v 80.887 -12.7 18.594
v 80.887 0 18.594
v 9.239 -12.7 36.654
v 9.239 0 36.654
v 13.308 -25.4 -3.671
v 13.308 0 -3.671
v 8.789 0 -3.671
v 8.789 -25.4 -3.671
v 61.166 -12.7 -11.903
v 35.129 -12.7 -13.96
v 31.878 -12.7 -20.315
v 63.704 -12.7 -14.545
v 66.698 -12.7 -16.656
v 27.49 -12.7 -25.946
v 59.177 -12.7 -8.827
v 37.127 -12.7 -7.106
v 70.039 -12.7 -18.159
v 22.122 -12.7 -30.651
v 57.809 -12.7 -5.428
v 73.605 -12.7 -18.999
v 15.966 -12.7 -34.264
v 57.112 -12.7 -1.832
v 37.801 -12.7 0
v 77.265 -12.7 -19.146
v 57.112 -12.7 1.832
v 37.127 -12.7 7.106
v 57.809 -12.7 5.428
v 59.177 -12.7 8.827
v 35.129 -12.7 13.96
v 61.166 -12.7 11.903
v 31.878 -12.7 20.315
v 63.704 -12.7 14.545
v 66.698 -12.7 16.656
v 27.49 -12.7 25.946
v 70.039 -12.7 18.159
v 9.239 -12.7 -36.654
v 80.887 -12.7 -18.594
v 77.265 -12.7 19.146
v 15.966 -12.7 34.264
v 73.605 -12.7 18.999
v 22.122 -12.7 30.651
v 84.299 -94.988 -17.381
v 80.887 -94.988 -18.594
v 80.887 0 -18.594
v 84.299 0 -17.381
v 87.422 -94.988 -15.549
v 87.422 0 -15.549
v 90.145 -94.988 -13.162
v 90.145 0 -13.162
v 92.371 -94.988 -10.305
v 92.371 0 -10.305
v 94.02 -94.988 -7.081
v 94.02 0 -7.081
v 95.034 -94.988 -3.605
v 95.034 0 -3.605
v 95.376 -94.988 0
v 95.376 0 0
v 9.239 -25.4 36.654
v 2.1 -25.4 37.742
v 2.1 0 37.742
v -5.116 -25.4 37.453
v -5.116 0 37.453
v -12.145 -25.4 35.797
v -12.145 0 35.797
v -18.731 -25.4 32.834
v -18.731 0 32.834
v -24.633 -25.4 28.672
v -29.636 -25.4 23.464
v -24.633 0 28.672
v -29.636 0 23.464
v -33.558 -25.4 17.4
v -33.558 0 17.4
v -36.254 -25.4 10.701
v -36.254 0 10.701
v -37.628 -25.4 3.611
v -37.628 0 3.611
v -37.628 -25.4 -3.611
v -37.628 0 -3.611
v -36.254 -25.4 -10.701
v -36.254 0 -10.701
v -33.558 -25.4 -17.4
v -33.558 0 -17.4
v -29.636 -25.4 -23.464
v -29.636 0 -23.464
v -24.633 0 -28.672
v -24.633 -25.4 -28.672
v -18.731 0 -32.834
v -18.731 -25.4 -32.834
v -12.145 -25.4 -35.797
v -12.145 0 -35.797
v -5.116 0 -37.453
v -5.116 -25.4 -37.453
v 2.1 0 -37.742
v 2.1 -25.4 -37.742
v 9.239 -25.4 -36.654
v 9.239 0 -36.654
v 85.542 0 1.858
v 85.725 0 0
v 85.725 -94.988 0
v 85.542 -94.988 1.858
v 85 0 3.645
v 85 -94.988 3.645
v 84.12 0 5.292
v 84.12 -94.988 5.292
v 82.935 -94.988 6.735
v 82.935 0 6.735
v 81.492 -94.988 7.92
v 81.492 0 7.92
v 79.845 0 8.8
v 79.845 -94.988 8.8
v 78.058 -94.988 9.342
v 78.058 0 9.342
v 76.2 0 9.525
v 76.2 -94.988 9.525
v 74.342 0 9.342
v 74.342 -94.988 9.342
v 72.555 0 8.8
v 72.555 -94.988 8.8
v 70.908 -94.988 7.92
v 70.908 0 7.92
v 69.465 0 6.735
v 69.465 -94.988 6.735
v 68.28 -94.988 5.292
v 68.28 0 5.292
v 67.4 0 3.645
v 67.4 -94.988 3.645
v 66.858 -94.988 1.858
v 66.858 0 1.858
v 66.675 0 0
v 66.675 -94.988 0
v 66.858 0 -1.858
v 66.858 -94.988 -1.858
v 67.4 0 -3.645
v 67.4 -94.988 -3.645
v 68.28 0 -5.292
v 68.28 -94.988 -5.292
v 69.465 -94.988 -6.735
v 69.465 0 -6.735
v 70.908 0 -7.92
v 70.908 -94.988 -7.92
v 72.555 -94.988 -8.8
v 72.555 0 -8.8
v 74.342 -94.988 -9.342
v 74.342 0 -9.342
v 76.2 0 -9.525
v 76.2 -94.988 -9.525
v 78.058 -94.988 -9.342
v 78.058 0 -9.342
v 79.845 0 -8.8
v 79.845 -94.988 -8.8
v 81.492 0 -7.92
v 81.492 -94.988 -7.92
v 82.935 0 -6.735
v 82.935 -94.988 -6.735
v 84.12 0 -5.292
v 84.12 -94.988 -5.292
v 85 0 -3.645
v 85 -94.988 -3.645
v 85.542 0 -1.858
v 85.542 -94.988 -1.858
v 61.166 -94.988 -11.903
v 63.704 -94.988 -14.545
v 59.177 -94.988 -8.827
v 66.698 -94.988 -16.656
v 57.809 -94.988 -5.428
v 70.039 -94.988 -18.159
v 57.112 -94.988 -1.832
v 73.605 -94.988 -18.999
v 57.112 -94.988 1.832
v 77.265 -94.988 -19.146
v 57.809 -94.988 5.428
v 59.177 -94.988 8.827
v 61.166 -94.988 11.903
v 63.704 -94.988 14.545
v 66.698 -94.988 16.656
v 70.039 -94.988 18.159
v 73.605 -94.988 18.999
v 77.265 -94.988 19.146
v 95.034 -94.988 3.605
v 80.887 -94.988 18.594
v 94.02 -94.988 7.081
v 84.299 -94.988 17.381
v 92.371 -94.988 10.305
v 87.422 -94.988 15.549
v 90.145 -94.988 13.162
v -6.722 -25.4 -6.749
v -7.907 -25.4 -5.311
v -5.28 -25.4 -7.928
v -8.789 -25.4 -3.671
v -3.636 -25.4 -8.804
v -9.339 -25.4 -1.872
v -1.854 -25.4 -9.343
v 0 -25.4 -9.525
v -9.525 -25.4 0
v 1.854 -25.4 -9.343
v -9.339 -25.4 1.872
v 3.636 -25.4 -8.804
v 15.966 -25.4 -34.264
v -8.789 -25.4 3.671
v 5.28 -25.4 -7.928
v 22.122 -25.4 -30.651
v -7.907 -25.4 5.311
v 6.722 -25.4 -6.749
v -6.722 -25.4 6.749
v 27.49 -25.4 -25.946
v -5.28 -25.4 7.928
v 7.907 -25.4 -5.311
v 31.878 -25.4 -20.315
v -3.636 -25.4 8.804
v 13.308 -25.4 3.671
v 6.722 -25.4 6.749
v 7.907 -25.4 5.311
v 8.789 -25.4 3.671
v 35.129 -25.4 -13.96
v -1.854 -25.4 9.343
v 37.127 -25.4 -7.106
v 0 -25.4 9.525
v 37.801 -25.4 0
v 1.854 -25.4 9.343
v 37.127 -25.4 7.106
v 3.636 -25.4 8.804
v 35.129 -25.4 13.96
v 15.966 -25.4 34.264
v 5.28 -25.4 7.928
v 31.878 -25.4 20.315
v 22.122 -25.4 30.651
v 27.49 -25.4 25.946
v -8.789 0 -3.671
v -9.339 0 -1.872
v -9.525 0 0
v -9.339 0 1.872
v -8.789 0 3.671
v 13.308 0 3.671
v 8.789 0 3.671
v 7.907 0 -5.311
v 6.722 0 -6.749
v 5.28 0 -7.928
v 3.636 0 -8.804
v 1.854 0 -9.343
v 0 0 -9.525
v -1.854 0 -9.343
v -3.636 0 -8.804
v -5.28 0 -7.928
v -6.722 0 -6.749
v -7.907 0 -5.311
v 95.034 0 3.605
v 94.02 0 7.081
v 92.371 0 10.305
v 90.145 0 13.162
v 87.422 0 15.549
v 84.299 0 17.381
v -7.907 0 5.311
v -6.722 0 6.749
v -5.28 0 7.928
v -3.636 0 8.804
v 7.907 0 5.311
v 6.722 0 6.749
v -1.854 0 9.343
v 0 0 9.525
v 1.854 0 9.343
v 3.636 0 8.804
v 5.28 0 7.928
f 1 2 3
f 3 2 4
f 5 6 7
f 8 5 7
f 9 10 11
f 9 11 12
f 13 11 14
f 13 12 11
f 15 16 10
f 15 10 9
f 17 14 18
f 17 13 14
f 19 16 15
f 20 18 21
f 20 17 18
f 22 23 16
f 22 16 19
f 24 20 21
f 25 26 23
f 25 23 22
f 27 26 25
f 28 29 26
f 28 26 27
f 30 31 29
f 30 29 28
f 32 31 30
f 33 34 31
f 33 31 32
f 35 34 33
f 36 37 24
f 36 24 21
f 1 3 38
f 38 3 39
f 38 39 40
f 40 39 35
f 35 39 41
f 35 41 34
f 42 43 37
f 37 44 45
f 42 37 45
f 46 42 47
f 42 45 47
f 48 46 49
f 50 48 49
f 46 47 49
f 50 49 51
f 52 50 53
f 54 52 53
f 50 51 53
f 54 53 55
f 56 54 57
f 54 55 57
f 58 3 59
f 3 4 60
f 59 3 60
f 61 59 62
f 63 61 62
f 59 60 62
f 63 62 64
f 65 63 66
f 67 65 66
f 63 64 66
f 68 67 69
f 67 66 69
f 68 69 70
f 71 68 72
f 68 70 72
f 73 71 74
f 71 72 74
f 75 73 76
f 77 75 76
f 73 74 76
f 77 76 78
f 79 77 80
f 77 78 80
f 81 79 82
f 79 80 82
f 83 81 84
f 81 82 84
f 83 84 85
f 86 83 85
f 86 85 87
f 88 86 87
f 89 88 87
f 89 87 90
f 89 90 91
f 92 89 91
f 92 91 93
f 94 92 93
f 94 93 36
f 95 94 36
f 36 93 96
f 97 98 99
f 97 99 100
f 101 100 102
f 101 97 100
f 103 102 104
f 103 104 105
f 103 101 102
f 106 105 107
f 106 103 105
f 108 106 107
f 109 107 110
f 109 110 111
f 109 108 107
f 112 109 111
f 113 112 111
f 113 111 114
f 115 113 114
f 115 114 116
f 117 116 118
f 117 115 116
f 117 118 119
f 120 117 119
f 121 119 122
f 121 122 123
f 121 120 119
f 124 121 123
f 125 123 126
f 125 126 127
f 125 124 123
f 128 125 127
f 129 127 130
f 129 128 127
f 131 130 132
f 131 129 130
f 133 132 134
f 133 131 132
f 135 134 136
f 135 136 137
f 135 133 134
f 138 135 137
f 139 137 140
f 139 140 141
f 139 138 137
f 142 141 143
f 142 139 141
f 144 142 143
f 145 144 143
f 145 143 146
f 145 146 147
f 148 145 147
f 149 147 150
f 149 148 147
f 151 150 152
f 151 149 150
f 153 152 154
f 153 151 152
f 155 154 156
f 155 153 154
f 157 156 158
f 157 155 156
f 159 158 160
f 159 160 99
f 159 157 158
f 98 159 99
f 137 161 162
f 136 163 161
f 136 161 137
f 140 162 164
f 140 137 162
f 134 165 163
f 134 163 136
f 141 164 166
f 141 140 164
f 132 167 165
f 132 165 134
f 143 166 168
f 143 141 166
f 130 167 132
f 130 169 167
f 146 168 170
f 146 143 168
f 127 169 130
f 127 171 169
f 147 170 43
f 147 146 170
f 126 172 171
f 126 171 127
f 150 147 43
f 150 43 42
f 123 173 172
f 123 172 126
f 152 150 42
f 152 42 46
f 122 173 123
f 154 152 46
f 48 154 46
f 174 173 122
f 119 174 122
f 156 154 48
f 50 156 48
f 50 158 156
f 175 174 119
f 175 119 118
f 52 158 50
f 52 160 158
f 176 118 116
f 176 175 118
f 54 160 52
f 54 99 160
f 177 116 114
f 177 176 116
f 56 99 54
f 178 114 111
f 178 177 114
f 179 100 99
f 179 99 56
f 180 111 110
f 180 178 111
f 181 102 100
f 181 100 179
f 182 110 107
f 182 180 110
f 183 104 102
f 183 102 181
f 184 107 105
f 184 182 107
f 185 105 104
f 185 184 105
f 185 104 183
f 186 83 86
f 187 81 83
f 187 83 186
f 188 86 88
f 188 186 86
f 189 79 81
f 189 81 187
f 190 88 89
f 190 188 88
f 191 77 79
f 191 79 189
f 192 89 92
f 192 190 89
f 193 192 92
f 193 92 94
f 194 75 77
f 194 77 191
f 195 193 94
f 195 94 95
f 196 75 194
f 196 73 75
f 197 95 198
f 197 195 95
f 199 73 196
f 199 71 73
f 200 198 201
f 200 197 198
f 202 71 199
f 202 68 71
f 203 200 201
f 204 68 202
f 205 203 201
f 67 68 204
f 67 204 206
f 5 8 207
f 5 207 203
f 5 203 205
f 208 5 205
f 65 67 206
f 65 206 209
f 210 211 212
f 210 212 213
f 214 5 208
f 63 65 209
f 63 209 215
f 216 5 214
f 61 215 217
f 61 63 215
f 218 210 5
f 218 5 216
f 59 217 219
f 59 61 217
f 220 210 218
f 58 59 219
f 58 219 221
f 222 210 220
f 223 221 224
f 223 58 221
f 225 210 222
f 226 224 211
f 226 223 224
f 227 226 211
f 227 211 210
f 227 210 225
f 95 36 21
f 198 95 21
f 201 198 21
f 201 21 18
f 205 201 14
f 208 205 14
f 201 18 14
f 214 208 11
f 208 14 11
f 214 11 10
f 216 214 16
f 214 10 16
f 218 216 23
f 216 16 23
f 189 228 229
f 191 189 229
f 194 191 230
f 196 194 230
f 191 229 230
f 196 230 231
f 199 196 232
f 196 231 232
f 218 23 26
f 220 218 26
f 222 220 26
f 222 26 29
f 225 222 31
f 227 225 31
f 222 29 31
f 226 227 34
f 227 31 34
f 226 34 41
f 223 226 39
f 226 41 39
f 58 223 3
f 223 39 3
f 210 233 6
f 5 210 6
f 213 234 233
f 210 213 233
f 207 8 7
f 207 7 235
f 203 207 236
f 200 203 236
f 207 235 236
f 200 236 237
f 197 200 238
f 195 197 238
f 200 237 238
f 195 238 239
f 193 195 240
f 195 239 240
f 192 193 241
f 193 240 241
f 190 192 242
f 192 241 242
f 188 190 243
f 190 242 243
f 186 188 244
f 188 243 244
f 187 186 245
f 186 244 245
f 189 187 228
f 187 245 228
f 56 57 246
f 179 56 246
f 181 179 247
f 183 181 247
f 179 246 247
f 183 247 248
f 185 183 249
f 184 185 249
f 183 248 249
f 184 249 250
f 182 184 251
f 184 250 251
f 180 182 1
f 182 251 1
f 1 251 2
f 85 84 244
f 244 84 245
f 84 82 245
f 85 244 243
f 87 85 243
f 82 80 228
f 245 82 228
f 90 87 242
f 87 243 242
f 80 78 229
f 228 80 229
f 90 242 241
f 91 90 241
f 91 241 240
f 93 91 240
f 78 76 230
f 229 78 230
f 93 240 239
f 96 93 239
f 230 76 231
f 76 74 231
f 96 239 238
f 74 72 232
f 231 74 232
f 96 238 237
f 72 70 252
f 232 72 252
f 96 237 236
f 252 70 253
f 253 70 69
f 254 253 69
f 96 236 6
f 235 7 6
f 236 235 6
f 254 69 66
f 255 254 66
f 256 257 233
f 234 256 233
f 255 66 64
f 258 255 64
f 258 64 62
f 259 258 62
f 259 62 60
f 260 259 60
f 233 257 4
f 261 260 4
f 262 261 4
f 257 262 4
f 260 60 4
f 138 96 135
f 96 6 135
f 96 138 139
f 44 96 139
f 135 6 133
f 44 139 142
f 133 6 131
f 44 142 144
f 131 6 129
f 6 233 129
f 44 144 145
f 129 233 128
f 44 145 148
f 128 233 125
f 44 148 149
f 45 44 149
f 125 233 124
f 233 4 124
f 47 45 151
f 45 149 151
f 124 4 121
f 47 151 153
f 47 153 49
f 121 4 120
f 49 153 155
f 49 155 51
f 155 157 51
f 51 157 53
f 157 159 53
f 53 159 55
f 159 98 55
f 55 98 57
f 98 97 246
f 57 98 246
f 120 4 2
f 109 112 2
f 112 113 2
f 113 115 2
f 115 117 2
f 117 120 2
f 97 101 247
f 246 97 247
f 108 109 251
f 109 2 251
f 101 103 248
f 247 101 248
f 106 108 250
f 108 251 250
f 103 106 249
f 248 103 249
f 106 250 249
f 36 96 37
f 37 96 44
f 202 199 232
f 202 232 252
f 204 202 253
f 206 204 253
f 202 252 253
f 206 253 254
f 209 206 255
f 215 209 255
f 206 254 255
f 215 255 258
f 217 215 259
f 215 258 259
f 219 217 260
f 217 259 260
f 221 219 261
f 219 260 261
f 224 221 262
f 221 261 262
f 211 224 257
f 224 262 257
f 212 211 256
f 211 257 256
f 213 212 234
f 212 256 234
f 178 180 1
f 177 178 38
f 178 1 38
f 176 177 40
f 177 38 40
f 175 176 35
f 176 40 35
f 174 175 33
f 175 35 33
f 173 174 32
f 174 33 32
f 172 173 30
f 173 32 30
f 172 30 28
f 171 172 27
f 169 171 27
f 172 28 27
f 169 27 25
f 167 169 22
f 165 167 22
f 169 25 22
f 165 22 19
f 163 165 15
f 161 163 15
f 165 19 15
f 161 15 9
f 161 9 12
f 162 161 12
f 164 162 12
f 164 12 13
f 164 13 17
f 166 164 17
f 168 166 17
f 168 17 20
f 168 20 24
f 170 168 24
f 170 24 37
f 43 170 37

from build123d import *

# Parameters (mm, degrees)
F1_DEPTH = 25.4
F2_DEPTH = 12.7
F0_R     = 9.525
F3_DEPTH = 94.98793


with BuildPart() as f1:
    # F0 (on Front) → F1 (new body)
    with BuildSketch(Plane.XZ):
        with BuildLine():
            ThreePointArc((9.239379, -36.65417), (29.817356, -23.234017), (37.800718, 0))
            ThreePointArc((37.800718, 0), (29.817356, 23.234017), (9.239379, 36.65417))
            ThreePointArc((9.239379, 36.65417), (-37.800718, 0), (9.239379, -36.65417))
        make_face()
        with BuildLine():
            ThreePointArc((-8.789045, 3.671282), (0, 9.525), (8.789045, 3.671282))
            Line((8.789045, 3.671282), (13.308408, 3.671282))
            Line((13.308408, 3.671282), (13.308408, -3.671282))
            Line((13.308408, -3.671282), (8.789045, -3.671282))
            ThreePointArc((8.789045, -3.671282), (0, -9.525), (-8.789045, -3.671282))
            Line((-8.789045, -3.671282), (-13.308408, -3.671282))
            Line((-13.308408, -3.671282), (-13.308408, 3.671282))
            Line((-13.308408, 3.671282), (-8.789045, 3.671282))
        make_face(mode=Mode.SUBTRACT)
        with BuildLine():
            ThreePointArc((-8.789045, -3.671282), (-9.525, 0), (-8.789045, 3.671282))
            Line((-8.789045, 3.671282), (-13.308408, 3.671282))
            Line((-13.308408, 3.671282), (-13.308408, -3.671282))
            Line((-13.308408, -3.671282), (-8.789045, -3.671282))
        make_face()
    extrude(amount=F1_DEPTH)

    # F0 (on Front) → F2 (join)
    with BuildSketch(Plane.XZ):
        with BuildLine():
            ThreePointArc((9.239379, 36.65417), (29.817356, 23.234017), (37.800718, 0))
            ThreePointArc((37.800718, 0), (29.817356, -23.234017), (9.239379, -36.65417))
            Line((9.239379, -36.65417), (80.886979, -18.594032))
            ThreePointArc((80.886979, -18.594032), (57.024344, 0), (80.886979, 18.594032))
            Line((80.886979, 18.594032), (9.239379, 36.65417))
        make_face()
    extrude(amount=F2_DEPTH)

    # F0 (on Front) → F3 (join)
    with BuildSketch(Plane.XZ):
        with BuildLine():
            ThreePointArc((95.375656, 0), (91.325834, 11.786219), (80.886979, 18.594032))
            ThreePointArc((80.886979, 18.594032), (57.024344, 0), (80.886979, -18.594032))
            ThreePointArc((80.886979, -18.594032), (91.325834, -11.786219), (95.375656, 0))
        make_face()
        with Locations((76.2, 0)):
            Circle(F0_R, mode=Mode.SUBTRACT)
    extrude(amount=F3_DEPTH)


solid = f1.part
